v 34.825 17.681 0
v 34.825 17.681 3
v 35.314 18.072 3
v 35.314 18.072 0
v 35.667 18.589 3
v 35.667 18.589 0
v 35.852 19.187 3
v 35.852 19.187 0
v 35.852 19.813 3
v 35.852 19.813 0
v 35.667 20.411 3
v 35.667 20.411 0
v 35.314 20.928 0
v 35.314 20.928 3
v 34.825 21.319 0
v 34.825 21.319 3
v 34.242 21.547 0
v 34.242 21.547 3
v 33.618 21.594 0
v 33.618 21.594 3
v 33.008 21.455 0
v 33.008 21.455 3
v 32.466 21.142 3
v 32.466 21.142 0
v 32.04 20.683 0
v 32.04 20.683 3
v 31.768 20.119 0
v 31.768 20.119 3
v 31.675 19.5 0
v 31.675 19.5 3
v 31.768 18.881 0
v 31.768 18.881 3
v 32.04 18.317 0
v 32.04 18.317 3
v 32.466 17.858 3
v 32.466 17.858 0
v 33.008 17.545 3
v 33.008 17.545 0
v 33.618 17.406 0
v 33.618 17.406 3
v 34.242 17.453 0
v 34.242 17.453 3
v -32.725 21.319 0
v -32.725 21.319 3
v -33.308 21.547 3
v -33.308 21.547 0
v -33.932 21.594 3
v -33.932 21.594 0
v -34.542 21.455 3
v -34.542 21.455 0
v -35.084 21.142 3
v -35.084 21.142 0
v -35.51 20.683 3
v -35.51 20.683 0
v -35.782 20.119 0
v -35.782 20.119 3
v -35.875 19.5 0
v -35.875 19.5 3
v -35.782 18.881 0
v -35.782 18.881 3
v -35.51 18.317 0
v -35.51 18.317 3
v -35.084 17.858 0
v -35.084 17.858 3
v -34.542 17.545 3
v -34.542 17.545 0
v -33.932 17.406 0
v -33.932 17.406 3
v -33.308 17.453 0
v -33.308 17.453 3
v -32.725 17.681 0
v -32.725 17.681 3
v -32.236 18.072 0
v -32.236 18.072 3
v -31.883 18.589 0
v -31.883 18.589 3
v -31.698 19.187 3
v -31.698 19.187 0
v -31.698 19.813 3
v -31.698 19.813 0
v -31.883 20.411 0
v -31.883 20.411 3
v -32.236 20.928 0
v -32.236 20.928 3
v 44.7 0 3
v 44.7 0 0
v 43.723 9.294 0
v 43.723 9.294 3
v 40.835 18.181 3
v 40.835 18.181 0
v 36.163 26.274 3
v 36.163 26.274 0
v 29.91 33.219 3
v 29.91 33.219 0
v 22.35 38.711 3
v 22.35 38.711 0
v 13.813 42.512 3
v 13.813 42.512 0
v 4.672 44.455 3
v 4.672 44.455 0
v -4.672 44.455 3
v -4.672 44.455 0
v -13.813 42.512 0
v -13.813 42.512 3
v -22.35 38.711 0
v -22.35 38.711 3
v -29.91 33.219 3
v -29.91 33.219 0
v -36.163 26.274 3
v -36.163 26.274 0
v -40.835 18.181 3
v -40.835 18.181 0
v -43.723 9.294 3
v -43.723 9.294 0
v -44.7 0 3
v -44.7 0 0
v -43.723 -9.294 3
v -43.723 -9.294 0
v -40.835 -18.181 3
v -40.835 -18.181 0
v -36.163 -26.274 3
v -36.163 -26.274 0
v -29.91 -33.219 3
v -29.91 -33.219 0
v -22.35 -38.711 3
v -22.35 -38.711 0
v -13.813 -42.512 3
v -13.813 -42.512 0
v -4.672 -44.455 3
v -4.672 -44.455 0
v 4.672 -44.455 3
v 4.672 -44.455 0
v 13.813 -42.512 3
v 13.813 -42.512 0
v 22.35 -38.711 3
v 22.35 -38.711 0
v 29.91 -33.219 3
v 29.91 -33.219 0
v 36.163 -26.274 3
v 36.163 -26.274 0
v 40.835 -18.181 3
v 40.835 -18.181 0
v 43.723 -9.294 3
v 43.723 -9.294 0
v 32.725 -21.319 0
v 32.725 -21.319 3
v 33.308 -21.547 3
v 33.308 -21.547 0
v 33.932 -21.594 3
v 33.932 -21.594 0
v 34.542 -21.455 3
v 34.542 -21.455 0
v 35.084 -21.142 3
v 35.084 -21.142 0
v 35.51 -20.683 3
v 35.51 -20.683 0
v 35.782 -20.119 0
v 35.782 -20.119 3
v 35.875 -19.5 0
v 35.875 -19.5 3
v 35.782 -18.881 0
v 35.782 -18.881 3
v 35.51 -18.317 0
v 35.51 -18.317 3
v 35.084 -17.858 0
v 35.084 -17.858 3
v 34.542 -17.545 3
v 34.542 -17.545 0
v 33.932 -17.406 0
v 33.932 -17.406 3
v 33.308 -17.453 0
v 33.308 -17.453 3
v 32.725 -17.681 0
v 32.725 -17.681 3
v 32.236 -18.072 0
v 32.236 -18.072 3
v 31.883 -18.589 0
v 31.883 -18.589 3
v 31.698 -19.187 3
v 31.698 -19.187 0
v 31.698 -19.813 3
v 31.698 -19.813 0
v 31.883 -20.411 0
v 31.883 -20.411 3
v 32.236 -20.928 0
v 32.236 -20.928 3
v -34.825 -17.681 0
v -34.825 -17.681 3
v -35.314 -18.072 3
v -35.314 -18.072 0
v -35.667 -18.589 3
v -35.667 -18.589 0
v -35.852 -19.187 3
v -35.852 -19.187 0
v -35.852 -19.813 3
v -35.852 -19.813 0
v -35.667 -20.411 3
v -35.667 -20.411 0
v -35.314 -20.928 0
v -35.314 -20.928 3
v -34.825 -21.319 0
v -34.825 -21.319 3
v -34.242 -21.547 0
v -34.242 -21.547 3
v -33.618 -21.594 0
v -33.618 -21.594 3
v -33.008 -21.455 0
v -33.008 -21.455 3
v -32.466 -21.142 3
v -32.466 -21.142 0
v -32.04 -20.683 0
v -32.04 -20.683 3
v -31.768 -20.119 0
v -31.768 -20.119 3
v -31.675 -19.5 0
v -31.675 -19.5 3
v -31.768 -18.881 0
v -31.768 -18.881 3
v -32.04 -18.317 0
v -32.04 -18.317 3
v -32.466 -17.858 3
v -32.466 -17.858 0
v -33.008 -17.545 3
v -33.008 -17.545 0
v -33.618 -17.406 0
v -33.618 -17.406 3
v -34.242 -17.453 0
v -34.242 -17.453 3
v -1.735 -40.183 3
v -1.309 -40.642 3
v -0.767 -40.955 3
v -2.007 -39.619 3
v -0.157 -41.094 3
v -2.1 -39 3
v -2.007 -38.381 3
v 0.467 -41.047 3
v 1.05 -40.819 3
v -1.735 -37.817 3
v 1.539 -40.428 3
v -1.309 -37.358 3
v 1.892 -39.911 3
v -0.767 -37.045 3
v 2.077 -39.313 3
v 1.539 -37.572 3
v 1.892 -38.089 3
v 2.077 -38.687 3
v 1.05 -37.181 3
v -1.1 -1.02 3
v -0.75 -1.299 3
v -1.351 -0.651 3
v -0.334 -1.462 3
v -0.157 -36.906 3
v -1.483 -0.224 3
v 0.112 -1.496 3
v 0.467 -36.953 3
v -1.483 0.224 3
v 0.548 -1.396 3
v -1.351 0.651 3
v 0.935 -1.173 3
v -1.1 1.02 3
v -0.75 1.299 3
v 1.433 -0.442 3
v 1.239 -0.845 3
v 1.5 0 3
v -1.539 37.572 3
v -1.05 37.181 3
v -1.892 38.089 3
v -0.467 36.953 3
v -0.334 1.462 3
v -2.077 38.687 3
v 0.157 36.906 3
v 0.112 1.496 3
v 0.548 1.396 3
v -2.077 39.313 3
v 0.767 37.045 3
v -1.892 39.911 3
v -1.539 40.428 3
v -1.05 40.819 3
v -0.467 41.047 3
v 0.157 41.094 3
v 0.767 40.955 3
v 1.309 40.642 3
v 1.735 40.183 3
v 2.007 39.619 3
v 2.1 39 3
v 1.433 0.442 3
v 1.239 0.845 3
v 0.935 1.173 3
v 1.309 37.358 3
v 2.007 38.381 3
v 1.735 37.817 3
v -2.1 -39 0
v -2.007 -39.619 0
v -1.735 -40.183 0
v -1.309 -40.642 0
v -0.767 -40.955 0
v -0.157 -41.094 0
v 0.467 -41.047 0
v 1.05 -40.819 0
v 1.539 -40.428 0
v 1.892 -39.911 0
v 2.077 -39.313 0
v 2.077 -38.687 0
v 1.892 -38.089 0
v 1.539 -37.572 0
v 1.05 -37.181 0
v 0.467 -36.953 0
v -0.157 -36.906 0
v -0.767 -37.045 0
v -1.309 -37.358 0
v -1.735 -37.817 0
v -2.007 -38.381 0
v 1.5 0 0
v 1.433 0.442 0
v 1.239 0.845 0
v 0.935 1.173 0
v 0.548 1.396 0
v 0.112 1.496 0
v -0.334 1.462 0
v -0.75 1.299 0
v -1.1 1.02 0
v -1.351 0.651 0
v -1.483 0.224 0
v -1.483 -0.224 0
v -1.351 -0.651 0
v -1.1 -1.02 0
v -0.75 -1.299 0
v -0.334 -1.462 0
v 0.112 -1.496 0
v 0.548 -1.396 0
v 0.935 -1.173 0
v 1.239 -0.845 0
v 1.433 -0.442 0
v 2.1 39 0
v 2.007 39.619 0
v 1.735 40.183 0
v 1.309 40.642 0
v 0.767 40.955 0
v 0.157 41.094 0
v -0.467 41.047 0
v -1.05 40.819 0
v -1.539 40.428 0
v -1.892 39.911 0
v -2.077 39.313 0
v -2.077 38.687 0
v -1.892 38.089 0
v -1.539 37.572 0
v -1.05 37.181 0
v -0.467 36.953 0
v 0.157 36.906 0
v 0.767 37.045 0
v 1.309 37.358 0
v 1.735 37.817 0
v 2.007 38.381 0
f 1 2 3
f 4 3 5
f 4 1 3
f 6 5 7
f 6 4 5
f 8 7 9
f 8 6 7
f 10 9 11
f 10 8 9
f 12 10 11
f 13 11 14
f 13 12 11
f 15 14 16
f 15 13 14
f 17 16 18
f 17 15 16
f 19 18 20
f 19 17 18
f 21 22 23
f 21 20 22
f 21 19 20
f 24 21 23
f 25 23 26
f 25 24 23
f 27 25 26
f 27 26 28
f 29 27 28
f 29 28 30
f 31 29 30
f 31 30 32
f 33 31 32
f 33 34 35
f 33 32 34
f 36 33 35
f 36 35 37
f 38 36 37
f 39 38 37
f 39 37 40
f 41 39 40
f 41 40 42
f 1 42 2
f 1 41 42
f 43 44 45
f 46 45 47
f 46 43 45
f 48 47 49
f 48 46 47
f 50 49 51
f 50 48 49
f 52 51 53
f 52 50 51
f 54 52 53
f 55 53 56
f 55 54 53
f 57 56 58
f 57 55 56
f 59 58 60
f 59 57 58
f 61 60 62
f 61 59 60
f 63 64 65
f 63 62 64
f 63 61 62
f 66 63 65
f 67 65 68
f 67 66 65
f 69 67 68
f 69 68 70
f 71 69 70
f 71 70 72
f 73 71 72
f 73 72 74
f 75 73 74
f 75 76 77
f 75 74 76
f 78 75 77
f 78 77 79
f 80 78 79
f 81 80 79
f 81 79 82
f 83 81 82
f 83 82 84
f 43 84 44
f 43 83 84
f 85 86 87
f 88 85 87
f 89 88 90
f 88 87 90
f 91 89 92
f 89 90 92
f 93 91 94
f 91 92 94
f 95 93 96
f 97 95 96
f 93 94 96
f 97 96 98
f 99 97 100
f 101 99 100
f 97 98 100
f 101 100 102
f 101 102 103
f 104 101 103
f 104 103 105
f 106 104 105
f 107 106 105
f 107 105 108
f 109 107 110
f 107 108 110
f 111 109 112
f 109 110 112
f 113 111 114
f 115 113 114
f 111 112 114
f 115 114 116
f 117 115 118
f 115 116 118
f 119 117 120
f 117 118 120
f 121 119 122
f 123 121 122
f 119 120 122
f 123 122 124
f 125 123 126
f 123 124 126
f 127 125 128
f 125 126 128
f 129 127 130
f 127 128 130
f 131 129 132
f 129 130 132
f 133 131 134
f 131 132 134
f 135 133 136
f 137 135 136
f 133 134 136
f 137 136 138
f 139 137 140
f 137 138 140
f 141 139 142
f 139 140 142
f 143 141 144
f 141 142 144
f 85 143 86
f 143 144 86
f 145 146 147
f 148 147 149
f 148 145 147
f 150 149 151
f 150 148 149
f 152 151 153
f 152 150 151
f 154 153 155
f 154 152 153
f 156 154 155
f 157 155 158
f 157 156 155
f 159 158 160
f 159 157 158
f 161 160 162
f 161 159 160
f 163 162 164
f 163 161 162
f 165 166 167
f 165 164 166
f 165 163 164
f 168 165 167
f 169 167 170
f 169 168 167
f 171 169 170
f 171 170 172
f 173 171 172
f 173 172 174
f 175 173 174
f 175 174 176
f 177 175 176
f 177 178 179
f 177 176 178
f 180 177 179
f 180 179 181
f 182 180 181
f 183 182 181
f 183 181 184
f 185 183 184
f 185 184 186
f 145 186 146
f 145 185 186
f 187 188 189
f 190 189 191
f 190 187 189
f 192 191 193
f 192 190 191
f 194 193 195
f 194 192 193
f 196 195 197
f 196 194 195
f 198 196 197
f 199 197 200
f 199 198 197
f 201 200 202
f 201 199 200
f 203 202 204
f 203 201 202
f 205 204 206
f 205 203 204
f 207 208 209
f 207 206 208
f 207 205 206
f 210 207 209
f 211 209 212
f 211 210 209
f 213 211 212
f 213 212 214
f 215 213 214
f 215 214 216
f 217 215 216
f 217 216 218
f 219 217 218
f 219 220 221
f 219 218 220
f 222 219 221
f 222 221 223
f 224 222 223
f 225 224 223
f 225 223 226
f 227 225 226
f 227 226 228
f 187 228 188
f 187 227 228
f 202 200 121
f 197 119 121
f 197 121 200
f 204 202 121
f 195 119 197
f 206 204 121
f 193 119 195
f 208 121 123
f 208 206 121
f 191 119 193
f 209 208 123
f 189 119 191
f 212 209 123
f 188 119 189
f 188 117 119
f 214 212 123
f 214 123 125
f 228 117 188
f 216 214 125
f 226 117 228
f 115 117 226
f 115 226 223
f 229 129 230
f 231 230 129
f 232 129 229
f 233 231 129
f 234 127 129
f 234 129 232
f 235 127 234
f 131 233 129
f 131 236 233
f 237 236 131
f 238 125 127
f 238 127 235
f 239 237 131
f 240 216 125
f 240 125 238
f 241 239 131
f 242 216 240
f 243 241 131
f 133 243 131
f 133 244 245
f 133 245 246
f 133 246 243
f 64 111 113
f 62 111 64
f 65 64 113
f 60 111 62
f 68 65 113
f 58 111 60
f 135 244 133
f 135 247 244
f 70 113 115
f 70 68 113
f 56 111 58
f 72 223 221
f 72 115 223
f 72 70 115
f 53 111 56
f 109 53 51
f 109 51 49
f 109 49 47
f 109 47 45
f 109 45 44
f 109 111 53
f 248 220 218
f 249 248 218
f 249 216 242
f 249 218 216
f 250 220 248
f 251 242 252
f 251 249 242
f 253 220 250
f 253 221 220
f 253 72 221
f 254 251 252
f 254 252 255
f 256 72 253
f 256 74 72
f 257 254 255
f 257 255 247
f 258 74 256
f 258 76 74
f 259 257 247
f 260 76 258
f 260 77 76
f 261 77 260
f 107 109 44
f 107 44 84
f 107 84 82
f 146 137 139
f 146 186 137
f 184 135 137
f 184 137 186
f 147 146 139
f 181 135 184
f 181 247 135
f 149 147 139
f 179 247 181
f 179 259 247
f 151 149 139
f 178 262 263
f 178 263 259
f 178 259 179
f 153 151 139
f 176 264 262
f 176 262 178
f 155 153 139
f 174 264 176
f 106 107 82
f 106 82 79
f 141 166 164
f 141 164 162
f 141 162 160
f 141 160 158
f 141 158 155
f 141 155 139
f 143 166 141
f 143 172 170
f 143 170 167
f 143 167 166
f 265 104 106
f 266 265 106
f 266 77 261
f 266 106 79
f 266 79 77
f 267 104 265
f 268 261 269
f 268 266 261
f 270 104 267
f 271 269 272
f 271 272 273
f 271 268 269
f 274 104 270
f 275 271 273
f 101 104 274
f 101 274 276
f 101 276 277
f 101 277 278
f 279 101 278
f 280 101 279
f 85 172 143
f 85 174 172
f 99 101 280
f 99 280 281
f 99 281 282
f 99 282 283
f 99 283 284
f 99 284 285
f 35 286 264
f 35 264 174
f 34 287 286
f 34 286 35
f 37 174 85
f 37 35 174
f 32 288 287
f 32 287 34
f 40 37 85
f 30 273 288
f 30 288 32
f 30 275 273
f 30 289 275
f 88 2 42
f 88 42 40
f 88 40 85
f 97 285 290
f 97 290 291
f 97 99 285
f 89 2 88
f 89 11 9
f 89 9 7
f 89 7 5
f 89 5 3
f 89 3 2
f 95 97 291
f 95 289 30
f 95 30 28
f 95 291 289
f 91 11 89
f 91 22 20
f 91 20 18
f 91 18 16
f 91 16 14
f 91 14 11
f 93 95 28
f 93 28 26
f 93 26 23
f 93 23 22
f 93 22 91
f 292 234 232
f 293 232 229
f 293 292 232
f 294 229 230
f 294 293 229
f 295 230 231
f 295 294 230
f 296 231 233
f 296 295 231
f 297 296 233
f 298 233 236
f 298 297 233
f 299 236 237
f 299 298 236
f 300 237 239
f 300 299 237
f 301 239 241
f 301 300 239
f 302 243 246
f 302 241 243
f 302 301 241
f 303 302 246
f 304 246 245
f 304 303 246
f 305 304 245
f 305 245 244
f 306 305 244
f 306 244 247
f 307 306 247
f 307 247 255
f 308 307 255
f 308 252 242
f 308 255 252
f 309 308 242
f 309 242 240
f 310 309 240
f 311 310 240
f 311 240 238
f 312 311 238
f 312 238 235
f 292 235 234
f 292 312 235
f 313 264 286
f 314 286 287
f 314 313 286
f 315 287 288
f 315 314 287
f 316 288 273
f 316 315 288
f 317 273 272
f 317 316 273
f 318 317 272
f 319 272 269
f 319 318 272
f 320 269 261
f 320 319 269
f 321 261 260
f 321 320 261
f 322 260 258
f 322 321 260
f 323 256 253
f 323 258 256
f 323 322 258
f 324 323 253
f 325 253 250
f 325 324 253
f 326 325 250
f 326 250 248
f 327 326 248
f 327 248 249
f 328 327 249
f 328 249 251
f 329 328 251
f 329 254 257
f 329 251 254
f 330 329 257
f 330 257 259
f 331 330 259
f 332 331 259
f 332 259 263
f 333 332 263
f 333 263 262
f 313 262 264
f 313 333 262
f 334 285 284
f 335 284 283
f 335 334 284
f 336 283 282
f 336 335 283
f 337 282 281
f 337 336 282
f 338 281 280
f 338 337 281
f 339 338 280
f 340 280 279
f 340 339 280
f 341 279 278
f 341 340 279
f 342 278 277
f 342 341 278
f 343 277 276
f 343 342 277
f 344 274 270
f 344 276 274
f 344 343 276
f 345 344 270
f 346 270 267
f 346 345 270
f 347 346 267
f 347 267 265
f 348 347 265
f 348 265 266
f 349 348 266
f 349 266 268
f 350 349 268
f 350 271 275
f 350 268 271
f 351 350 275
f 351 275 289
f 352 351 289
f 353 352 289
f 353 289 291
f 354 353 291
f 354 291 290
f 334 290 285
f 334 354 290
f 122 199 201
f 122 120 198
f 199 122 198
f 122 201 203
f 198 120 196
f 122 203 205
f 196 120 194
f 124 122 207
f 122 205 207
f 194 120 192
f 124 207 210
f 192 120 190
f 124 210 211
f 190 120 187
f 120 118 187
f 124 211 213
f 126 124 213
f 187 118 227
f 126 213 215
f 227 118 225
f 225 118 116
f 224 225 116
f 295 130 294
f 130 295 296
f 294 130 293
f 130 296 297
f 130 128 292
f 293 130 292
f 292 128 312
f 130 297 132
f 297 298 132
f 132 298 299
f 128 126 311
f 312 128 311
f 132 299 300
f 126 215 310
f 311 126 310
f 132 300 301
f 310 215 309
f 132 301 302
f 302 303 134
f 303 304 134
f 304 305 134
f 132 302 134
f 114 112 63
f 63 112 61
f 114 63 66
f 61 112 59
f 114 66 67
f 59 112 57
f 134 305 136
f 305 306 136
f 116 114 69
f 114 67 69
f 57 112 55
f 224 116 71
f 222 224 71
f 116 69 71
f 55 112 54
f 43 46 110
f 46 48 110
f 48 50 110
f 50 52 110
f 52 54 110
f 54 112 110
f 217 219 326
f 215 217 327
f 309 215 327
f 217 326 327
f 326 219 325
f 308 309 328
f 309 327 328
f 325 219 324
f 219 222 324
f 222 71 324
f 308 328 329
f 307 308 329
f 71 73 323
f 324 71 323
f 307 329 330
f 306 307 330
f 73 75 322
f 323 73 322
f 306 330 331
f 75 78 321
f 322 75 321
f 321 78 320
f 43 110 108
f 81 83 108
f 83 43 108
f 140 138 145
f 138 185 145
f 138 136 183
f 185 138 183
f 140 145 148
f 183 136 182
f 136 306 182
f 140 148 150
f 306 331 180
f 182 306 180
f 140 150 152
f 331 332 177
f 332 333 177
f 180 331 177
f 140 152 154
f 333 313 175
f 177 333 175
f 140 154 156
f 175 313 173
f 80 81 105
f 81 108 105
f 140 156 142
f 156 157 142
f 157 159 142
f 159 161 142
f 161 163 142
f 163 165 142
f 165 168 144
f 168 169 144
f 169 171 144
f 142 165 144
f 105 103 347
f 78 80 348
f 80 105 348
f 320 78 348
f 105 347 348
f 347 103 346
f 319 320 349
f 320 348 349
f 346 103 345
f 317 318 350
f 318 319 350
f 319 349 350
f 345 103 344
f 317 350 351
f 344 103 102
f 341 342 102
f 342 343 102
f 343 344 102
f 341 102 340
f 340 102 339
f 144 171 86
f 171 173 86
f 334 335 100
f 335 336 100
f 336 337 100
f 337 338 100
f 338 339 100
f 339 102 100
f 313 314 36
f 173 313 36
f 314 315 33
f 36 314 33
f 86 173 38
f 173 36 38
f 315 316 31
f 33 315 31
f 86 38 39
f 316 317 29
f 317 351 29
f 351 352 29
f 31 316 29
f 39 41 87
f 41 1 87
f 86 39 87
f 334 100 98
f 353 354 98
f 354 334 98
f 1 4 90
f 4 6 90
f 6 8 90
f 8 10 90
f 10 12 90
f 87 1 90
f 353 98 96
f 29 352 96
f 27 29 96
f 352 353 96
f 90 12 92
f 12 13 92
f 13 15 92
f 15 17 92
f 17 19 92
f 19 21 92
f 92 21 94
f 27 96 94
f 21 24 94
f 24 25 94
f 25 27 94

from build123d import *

# Parameters (mm, degrees)
SKETCH_1_R               = 44.7
EXTRUDE_1_DEPTH          = 3
SKETCH_1_5_R             = 1.5
CUT_EXTRUDE_1_DEPTH      = 73.5
SKETCH_1_6_R             = 2.1
CUT_EXTRUDE_2_DEPTH      = 42
PATTERN_CIRCULAR_1_COUNT = 6


with BuildPart() as part:
    # Эскиз1 → Бобышка-Вытянуть1 (new body)
    with BuildSketch(Plane.XY):
        Circle(SKETCH_1_R)
    extrude(amount=EXTRUDE_1_DEPTH)

    # Эскиз1<5> → Вырез-Вытянуть1 (cut)
    with BuildSketch(Plane.XY):
        Circle(SKETCH_1_5_R)
    extrude(amount=CUT_EXTRUDE_1_DEPTH, mode=Mode.SUBTRACT)

    # Эскиз1<6> → Вырез-Вытянуть2 (cut)
    with BuildSketch(Plane.XY):
        with Locations((0, 39)):
            Circle(SKETCH_1_6_R)
    cut_extrude_2 = extrude(amount=CUT_EXTRUDE_2_DEPTH, mode=Mode.SUBTRACT)

    # Круговой массив1: Вырез-Вытянуть2 ×6 about axis
    pattern_circular_1_axis = Axis((0, 0, 3), (0, 0, -1))
    for i in range(1, PATTERN_CIRCULAR_1_COUNT):
        add(cut_extrude_2.rotate(pattern_circular_1_axis, i * 360 / PATTERN_CIRCULAR_1_COUNT), mode=Mode.SUBTRACT)


solid = part.part
